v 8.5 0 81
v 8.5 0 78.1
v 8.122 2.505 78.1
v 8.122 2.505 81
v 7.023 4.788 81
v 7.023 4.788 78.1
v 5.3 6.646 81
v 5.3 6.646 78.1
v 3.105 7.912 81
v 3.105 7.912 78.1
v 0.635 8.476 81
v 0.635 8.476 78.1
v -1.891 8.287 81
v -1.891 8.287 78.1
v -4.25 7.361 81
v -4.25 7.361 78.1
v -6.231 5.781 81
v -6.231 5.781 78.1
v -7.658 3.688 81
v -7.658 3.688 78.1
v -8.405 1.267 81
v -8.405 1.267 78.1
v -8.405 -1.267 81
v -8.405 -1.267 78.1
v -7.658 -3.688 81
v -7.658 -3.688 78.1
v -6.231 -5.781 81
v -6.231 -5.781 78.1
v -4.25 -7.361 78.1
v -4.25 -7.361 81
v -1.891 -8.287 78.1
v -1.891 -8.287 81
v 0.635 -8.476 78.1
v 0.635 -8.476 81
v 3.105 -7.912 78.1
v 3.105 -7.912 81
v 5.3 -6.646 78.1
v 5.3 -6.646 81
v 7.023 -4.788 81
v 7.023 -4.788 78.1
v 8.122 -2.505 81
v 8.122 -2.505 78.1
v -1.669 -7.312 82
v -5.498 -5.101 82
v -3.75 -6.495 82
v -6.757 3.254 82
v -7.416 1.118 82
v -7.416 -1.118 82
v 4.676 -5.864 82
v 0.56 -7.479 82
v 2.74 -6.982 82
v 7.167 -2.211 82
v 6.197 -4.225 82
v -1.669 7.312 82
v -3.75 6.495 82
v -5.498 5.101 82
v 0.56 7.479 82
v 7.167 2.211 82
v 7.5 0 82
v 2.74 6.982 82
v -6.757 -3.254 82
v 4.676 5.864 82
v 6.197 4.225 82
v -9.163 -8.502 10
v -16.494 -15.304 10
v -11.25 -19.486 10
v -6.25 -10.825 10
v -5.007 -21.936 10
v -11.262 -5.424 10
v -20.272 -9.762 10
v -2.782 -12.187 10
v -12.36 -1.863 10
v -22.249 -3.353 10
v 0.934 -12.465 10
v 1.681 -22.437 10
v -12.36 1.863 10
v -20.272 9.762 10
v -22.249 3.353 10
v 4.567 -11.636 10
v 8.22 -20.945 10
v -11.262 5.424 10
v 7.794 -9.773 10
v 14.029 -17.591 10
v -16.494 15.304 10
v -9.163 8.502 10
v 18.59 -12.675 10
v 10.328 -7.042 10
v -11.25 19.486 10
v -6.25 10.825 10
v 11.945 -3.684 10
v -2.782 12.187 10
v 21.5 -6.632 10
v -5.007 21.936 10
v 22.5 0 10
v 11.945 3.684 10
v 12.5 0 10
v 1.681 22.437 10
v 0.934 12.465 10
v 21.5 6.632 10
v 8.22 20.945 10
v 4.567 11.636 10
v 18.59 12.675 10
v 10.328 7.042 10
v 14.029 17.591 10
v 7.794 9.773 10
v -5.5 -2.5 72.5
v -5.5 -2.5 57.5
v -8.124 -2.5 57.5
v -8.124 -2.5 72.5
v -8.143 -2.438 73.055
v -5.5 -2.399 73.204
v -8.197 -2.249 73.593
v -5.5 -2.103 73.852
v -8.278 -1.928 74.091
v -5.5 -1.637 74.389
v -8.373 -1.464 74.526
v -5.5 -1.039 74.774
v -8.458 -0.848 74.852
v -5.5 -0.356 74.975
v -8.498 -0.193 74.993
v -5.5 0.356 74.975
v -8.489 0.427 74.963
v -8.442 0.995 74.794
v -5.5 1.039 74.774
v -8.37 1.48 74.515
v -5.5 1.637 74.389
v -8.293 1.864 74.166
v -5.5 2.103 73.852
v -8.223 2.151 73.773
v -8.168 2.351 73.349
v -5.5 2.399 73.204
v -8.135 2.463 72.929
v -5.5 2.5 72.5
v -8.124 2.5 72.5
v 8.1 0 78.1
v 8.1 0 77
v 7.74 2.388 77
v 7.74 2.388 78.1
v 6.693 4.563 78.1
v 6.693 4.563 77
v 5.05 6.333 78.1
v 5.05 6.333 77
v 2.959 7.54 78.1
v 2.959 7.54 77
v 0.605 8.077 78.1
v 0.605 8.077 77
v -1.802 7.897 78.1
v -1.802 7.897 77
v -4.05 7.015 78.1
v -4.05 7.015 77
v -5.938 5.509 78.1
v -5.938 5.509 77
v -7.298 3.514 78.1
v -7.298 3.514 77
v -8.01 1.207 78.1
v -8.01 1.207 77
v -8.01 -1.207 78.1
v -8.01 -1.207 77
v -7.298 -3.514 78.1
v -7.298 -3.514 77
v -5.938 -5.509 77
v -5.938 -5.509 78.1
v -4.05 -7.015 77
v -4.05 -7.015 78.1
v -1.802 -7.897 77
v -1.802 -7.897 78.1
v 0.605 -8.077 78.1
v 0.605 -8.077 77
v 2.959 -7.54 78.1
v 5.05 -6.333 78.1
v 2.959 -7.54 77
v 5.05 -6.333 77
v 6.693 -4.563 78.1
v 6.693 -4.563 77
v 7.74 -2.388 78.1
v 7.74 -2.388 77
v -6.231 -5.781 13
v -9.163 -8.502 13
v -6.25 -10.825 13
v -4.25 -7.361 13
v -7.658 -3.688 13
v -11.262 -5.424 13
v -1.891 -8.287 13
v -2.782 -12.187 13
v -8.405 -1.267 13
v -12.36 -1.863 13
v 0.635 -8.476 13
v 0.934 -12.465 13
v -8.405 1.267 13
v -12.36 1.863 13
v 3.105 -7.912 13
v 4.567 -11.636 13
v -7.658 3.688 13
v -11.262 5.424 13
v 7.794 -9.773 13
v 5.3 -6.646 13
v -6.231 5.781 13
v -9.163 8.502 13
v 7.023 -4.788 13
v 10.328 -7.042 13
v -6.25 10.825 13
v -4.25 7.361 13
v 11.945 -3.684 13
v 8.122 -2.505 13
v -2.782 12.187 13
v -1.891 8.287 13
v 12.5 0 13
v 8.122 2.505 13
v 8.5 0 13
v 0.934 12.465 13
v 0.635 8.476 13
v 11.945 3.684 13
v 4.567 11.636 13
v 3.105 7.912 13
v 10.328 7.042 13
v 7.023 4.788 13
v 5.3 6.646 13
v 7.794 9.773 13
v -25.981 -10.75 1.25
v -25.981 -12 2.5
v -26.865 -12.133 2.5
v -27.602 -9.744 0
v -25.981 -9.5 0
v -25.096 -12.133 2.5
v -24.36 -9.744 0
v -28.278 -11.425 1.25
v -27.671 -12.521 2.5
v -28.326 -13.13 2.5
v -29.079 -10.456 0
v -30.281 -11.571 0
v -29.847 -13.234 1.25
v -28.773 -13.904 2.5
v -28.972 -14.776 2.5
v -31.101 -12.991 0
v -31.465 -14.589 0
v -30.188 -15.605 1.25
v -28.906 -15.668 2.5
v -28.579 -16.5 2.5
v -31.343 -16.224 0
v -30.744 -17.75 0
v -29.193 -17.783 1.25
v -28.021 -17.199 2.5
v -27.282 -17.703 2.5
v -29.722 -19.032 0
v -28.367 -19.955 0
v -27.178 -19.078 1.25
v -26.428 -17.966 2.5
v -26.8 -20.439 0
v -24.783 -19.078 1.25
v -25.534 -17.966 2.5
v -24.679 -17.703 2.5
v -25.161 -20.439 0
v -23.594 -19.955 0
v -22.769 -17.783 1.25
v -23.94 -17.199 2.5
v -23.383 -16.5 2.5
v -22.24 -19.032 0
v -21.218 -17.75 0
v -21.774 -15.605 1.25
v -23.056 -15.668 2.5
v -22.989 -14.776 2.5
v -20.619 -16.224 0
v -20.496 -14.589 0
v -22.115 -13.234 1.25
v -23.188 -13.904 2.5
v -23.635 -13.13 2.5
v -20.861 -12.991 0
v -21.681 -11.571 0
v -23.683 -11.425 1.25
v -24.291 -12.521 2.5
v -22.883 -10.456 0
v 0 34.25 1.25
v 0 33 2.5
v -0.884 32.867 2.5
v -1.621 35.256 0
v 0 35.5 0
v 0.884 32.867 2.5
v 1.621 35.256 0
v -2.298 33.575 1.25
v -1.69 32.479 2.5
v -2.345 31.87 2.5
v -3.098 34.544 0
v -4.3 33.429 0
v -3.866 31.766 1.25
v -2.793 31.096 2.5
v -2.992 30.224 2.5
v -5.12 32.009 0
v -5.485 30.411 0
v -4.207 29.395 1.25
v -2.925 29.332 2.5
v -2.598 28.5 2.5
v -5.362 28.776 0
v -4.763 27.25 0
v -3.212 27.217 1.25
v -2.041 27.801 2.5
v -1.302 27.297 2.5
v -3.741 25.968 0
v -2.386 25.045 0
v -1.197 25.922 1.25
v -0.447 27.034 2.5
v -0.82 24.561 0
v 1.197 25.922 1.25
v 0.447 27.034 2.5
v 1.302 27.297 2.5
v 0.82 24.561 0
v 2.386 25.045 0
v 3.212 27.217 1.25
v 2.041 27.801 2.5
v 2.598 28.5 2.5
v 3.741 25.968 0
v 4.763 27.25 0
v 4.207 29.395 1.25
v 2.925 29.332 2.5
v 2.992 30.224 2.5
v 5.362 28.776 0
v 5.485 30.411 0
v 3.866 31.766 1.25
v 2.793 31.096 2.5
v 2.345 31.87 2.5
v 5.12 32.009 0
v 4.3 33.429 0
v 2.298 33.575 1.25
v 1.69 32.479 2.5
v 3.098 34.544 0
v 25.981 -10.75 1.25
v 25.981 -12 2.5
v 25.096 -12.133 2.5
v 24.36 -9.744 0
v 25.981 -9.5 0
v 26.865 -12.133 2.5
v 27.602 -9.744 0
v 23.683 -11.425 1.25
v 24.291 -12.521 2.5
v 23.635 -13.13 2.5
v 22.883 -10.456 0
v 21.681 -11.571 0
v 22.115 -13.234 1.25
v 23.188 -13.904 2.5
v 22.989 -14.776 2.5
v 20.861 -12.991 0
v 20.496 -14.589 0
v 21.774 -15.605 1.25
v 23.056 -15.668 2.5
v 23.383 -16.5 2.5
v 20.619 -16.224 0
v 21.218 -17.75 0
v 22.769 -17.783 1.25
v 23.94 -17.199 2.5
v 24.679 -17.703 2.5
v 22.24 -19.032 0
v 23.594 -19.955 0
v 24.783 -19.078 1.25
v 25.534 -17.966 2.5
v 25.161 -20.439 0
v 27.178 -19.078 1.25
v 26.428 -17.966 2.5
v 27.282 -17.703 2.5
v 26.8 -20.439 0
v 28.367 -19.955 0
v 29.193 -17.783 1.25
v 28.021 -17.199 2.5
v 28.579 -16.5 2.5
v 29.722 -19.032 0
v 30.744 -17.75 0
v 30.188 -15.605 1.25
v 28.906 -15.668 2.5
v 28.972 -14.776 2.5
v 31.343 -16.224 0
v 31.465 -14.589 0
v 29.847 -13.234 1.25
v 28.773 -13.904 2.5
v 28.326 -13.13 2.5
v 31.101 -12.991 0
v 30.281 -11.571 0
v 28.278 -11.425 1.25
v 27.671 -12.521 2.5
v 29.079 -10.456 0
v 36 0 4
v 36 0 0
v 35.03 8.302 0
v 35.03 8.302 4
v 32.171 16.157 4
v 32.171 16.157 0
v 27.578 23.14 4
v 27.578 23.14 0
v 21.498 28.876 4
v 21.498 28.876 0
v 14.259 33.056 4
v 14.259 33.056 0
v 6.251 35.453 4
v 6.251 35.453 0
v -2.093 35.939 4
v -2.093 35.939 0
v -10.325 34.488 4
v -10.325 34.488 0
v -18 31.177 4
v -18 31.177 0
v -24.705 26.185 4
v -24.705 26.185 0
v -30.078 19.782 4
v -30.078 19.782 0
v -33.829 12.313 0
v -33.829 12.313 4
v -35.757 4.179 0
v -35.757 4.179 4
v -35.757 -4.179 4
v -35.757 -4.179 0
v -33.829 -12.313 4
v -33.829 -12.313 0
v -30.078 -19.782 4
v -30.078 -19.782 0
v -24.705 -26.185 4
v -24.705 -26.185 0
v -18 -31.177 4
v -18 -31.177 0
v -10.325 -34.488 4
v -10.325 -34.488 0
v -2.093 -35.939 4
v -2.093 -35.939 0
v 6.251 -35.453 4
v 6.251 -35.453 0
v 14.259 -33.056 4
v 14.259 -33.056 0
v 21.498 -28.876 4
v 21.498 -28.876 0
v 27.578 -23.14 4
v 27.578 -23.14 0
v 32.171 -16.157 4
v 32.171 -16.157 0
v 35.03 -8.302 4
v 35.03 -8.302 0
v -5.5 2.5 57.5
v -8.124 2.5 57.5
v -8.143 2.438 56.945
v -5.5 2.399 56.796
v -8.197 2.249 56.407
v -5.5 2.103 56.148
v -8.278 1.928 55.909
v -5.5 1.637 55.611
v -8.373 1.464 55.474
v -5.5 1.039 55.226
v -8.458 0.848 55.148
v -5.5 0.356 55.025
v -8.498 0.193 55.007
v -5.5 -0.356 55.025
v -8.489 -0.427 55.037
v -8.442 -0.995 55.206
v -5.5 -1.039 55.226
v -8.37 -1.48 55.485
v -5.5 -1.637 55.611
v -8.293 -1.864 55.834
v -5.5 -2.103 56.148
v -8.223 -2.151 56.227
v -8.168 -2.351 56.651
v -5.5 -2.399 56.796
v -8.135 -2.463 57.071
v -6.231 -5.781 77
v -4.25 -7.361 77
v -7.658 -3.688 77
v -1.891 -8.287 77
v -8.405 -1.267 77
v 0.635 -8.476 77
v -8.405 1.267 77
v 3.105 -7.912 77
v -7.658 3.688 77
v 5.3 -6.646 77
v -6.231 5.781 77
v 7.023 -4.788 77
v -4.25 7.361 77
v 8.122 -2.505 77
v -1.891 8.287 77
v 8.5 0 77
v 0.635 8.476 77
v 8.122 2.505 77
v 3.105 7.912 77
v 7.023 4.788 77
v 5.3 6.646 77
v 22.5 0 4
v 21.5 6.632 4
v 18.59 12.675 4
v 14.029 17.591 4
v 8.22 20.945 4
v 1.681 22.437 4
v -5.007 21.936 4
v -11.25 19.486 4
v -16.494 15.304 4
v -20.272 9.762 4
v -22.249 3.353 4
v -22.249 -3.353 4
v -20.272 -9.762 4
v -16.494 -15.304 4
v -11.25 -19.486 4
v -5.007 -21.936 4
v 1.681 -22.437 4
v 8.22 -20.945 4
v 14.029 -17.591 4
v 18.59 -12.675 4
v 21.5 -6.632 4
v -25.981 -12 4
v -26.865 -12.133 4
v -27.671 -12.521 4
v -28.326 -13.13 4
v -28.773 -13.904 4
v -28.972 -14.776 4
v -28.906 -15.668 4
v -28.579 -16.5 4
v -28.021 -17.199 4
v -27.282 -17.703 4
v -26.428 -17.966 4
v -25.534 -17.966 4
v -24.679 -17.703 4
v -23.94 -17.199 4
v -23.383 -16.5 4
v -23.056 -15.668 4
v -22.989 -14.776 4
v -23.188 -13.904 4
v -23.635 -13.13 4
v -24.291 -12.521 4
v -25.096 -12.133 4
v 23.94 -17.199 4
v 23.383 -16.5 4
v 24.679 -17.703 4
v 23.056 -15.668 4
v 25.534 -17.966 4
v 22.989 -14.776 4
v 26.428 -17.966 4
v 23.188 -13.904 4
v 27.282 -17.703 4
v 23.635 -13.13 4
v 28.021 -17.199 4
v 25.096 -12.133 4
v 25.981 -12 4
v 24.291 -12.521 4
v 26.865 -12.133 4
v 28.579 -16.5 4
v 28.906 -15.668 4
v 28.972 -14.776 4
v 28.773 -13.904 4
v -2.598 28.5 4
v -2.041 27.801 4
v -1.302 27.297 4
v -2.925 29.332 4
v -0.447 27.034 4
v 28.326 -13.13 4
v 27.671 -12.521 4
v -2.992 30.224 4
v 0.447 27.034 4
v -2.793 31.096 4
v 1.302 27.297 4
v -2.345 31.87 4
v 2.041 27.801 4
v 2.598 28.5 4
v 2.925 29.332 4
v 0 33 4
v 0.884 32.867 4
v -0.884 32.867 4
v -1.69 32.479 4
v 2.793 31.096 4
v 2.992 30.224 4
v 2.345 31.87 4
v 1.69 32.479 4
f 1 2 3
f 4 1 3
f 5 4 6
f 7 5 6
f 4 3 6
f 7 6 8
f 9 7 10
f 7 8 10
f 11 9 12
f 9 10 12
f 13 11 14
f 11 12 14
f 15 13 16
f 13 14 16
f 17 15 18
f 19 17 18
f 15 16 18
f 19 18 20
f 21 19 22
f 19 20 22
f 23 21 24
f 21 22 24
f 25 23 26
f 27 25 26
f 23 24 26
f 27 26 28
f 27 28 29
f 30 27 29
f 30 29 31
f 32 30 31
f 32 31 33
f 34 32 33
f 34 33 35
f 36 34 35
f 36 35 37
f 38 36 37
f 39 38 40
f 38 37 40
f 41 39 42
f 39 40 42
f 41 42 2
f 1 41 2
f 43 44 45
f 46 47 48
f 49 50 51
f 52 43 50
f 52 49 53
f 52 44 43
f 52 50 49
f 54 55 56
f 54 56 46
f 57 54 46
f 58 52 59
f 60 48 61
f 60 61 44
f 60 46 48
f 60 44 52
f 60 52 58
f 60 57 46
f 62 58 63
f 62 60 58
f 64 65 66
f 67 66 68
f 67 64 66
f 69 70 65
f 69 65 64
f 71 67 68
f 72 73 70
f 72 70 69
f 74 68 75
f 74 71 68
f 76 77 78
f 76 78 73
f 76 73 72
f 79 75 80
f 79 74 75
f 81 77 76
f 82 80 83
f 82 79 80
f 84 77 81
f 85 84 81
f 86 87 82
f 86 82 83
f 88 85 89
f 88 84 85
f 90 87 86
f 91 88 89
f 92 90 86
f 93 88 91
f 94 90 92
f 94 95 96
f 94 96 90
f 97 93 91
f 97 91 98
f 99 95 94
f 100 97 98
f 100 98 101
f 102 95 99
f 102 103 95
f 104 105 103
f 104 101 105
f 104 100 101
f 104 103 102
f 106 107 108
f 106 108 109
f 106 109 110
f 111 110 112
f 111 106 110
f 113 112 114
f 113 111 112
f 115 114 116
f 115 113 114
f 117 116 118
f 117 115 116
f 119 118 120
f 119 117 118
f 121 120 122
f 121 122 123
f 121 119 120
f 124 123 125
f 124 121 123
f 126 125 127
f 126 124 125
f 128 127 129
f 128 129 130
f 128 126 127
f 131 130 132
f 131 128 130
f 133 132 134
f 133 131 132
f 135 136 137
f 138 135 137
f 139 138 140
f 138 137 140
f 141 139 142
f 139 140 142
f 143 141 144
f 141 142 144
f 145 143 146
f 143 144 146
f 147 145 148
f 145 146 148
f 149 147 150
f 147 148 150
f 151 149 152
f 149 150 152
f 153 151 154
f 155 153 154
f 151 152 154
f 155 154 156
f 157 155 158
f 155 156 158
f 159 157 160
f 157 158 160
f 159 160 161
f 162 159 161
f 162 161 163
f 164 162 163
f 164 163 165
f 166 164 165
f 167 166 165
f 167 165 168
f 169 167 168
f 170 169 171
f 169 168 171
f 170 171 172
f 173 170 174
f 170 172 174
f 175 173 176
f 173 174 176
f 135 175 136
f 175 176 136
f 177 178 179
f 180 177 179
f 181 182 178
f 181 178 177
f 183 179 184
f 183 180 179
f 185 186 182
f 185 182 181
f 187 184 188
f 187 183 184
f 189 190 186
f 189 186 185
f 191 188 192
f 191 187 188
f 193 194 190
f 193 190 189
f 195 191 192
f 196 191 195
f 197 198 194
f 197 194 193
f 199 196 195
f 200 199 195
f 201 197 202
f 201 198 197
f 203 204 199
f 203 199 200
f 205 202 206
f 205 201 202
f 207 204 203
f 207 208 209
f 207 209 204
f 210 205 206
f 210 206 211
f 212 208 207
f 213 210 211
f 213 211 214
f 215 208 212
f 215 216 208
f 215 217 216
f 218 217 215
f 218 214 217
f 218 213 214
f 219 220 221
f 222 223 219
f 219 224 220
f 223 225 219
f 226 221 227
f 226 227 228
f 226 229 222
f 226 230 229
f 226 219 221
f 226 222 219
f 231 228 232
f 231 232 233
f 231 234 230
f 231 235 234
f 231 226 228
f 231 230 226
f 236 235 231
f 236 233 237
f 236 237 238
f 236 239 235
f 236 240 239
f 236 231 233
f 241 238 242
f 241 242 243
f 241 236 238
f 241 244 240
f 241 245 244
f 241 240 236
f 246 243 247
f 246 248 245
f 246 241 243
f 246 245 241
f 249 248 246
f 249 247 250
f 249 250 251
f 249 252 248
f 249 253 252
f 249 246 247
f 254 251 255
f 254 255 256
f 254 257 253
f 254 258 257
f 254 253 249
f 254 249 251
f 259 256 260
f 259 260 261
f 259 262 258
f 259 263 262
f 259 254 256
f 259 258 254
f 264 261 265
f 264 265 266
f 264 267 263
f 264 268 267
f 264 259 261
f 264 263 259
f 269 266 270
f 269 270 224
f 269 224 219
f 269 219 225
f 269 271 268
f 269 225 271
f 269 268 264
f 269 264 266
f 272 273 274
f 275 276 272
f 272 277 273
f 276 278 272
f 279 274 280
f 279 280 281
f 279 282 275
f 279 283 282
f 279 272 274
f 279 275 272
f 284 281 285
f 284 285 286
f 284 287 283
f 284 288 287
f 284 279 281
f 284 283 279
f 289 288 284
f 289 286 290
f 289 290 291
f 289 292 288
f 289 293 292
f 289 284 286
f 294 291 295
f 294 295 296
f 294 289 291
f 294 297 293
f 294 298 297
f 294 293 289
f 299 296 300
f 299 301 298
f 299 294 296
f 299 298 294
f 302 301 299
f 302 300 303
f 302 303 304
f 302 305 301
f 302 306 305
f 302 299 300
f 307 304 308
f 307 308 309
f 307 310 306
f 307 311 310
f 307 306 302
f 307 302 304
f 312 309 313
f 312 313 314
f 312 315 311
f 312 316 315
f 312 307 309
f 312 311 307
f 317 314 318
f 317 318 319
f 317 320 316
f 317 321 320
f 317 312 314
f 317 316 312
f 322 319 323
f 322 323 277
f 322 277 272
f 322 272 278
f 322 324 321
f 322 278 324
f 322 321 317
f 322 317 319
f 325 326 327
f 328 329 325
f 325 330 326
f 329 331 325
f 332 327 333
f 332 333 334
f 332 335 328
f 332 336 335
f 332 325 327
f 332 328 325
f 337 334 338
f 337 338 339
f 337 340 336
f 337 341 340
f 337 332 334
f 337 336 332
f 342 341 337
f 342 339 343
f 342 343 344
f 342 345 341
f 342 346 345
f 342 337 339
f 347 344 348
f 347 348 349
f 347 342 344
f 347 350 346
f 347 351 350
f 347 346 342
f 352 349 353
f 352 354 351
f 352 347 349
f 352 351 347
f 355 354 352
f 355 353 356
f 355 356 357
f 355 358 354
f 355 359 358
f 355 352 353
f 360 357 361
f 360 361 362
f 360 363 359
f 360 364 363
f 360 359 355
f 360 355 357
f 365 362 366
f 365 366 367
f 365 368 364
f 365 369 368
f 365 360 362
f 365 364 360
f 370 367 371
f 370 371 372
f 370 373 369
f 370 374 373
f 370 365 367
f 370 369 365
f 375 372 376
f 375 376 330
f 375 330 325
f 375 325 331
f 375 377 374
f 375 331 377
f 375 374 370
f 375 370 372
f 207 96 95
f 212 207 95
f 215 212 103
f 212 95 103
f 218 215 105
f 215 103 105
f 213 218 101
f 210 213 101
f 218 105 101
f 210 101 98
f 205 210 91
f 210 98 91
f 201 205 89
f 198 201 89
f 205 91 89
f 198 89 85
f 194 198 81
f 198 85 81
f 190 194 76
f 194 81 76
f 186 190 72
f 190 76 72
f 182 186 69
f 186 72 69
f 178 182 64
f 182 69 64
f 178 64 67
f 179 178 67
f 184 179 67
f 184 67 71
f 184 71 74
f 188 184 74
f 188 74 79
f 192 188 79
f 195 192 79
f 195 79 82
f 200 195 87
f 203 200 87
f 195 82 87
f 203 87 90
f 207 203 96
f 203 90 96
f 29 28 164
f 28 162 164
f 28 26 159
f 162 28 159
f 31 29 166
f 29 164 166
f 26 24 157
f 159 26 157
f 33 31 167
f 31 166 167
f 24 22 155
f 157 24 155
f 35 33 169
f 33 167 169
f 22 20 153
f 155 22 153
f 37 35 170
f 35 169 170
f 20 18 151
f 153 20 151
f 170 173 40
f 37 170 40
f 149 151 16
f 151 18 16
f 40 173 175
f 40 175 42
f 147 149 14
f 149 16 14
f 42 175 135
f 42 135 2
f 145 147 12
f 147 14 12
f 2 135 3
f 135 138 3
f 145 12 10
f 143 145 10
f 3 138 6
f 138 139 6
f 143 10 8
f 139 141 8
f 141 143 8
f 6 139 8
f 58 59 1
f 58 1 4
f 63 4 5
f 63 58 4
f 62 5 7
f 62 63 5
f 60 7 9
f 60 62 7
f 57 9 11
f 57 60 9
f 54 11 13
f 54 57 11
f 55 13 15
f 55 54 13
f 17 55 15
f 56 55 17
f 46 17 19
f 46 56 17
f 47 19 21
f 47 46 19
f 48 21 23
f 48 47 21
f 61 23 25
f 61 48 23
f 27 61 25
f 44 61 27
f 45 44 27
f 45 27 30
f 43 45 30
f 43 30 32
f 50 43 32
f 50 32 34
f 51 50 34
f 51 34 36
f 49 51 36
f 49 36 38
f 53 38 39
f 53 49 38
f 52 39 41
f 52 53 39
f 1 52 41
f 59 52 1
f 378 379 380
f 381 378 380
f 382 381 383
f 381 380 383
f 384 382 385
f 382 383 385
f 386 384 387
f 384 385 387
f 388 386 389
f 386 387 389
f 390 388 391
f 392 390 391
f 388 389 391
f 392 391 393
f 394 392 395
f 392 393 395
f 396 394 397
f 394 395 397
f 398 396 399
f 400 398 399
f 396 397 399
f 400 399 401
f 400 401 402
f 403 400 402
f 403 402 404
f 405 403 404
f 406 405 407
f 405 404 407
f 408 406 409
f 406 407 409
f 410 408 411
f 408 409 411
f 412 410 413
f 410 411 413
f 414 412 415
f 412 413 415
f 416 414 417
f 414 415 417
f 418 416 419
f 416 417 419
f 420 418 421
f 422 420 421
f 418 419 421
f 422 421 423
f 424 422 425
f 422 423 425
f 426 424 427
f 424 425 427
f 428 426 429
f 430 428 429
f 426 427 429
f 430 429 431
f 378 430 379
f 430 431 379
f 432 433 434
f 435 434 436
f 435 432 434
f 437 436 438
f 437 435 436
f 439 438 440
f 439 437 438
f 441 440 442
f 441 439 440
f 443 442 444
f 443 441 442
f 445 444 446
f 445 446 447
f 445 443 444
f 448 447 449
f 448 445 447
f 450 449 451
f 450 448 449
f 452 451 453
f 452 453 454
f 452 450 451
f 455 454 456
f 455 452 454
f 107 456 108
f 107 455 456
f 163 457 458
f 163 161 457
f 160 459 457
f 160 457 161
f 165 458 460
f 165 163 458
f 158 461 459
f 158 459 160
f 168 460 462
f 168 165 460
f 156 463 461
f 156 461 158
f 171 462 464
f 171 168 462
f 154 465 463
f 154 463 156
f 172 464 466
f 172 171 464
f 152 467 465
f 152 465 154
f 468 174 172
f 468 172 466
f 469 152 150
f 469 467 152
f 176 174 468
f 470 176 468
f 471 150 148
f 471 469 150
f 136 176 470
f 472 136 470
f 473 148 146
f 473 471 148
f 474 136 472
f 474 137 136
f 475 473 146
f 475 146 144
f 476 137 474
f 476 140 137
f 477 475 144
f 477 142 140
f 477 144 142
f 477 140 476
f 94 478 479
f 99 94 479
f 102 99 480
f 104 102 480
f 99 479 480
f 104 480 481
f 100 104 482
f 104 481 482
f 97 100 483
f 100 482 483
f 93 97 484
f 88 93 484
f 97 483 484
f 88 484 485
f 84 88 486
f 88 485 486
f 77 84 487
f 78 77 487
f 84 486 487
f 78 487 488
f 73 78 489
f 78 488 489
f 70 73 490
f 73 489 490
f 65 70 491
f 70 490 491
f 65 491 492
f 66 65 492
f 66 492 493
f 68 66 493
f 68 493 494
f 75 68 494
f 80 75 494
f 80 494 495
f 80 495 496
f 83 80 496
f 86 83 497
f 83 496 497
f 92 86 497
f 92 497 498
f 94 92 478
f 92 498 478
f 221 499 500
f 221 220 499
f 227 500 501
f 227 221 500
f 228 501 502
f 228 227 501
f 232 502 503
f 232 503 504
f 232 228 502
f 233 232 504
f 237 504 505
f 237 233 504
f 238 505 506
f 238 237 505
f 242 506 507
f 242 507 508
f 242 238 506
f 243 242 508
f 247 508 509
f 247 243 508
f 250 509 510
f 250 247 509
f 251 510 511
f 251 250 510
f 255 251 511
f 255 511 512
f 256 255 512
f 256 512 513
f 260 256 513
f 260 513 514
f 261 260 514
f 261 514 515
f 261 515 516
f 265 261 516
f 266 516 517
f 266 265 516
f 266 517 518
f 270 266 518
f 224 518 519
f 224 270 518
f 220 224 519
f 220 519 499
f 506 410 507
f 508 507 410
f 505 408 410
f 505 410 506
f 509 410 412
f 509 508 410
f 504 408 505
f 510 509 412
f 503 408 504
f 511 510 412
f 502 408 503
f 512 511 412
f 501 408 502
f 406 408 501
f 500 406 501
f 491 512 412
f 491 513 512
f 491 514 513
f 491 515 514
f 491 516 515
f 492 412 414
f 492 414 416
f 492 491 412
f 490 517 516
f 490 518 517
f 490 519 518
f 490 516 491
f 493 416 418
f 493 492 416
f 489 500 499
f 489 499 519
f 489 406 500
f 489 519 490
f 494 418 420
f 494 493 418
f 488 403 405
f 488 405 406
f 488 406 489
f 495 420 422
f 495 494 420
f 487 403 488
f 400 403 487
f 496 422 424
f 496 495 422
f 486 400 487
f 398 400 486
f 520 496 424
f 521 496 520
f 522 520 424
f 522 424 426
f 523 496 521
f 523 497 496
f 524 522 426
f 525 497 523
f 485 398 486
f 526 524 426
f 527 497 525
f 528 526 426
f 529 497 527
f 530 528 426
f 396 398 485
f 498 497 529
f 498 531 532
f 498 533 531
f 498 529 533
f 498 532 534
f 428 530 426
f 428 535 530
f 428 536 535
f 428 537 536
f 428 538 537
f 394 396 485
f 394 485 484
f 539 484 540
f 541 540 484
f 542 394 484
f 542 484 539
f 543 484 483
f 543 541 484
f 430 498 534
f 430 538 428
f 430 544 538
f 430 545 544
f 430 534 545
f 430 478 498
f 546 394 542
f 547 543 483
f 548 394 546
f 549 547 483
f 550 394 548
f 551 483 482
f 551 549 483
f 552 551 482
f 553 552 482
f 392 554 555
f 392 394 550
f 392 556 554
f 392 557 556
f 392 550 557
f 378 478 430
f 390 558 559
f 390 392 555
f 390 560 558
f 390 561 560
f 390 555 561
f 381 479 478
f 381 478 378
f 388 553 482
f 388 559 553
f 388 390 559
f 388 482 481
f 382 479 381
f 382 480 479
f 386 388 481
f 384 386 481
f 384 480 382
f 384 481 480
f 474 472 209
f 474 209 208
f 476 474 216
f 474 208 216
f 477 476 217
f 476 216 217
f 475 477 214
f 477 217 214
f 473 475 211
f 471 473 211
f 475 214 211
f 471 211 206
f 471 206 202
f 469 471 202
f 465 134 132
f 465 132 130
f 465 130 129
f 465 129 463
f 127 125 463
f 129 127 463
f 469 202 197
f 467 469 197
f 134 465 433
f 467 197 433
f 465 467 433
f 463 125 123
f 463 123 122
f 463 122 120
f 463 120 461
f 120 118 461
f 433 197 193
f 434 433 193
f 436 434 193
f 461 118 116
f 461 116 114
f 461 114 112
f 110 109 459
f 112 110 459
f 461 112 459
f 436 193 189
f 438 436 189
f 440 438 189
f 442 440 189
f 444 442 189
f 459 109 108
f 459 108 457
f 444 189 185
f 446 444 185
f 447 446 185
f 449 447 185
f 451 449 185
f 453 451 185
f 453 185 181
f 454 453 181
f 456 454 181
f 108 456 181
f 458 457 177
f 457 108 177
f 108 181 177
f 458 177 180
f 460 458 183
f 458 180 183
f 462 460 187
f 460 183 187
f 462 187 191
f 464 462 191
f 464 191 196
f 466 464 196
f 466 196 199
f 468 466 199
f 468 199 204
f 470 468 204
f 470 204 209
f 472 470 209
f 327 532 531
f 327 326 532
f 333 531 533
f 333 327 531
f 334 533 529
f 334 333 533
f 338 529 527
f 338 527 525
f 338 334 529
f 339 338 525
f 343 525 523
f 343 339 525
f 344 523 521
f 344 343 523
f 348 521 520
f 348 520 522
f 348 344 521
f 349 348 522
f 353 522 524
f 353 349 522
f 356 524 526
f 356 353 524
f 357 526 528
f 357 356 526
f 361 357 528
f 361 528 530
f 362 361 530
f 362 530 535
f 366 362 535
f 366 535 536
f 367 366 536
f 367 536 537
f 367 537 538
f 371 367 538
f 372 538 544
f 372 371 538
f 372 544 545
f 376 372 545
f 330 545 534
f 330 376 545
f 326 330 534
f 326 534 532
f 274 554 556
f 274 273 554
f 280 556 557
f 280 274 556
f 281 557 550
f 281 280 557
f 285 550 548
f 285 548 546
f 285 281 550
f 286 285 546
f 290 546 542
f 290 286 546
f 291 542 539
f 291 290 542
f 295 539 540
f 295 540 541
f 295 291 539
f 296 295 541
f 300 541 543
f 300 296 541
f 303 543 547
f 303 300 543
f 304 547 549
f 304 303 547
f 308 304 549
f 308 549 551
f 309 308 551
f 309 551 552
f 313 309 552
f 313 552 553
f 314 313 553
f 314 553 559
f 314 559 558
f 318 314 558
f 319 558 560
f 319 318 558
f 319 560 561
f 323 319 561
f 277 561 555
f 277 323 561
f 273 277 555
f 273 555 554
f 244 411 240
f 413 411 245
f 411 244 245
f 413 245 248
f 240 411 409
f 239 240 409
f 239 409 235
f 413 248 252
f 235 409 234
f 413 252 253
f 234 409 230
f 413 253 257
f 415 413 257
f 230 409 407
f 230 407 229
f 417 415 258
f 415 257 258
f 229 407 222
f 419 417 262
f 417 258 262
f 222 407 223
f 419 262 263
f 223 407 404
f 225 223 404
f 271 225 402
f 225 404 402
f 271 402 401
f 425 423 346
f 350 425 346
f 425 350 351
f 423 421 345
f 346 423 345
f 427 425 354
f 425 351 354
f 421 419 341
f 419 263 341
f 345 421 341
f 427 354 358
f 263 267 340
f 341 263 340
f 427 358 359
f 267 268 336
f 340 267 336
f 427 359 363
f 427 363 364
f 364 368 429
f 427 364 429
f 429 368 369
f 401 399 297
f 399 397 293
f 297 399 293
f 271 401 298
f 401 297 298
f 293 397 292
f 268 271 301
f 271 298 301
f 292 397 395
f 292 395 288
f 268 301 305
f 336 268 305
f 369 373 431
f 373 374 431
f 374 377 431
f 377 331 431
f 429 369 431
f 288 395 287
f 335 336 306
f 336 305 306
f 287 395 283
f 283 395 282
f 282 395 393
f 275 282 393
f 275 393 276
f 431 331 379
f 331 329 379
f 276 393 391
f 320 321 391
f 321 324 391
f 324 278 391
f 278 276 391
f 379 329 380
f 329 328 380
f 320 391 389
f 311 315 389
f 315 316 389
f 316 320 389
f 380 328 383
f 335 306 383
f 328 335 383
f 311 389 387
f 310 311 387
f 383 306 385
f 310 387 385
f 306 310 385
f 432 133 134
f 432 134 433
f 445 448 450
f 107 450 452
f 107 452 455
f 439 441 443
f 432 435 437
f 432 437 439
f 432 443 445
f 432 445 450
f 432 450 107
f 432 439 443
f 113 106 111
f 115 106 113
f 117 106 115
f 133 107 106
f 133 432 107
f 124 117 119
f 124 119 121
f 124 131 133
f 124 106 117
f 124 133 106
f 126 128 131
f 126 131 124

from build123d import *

# Parameters (mm, degrees)
SKETCH_1_R                     = 36
EXTRUDE_1_DEPTH                = 4
SKETCH_2_R                     = 22.5
EXTRUDE_2_DEPTH                = 6
SKETCH_3_R                     = 12.5
EXTRUDE_3_DEPTH                = 3
SKETCH_4_R                     = 8.5
EXTRUDE_4_DEPTH                = 64
SKETCH_5_R                     = 8.1
EXTRUDE_5_DEPTH                = 1.1
SKETCH_6_R                     = 8.5
EXTRUDE_6_DEPTH                = 3.9
CHAMFER_1_SIZE                 = 1
HOLE_WIZARD_6_0_6_1_AT_2_COUNT = 2
HOLE_WIZARD_6_0_6_1_AT_2_PITCH = 51.961524227
HOLE_WIZARD_6_0_6_1_AT_3_COUNT = 2
HOLE_WIZARD_6_0_6_1_AT_3_PITCH = 51.961524227
CUT_EXTRUDE_START              = -5.5
CUT_EXTRUDE_1_DEPTH            = 92.019428096


with BuildPart() as part:
    # 草图1 → 凸台-拉伸1 (new body)
    with BuildSketch(Plane.XY):
        Circle(SKETCH_1_R)
    extrude(amount=EXTRUDE_1_DEPTH)

    # 草图2 → 凸台-拉伸2 (add)
    with BuildSketch(Plane.XY.offset(4)):
        Circle(SKETCH_2_R)
    extrude(amount=EXTRUDE_2_DEPTH)

    # 草图3 → 凸台-拉伸3 (add)
    with BuildSketch(Plane.XY.offset(10)):
        Circle(SKETCH_3_R)
    extrude(amount=EXTRUDE_3_DEPTH)

    # 草图4 → 凸台-拉伸4 (add)
    with BuildSketch(Plane.XY.offset(13)):
        Circle(SKETCH_4_R)
    extrude(amount=EXTRUDE_4_DEPTH)

    # 草图5 → 凸台-拉伸5 (add)
    with BuildSketch(Plane.XY.offset(77)):
        Circle(SKETCH_5_R)
    extrude(amount=EXTRUDE_5_DEPTH)

    # 草图6 → 凸台-拉伸6 (add)
    with BuildSketch(Plane.XY.offset(78.1)):
        Circle(SKETCH_6_R)
    extrude(amount=EXTRUDE_6_DEPTH)

    # 倒角1
    chamfer_1_edges = [part.edges().sort_by_distance(p)[0] for p in [
        (-8.5, 0, 82),
    ]]
    chamfer(chamfer_1_edges, length=CHAMFER_1_SIZE)

    # 草图8 → Ø6.0 (6) 直径孔1 (revolve, cut)
    with BuildSketch(Plane(origin=(-25.980762114, -15, 0), x_dir=(0, 1, 0), z_dir=(1, 0, 0))):
        Polygon((0, 0), (0, 4), (3, 4), (3, 2.5), (5.5, 0), align=None)
    hole_wizard_6_0_6_1 = revolve(axis=Axis((-25.980762114, -15, -6.35), (0, 0, 1)), mode=Mode.SUBTRACT)

    # Ø6.0 (6) 直径孔1 at 2: Ø6.0 (6) 直径孔1 ×2
    with Locations(*[Vector(0.499999999999998, 0.8660254037844398, 0) * (i * HOLE_WIZARD_6_0_6_1_AT_2_PITCH) for i in range(1, HOLE_WIZARD_6_0_6_1_AT_2_COUNT)]):
        add(hole_wizard_6_0_6_1, mode=Mode.SUBTRACT)

    # Ø6.0 (6) 直径孔1 at 3: Ø6.0 (6) 直径孔1 ×2
    with Locations(*[(i * HOLE_WIZARD_6_0_6_1_AT_3_PITCH, 0, 0) for i in range(1, HOLE_WIZARD_6_0_6_1_AT_3_COUNT)]):
        add(hole_wizard_6_0_6_1, mode=Mode.SUBTRACT)

    # 草图9 → 切除-拉伸1 (cut, through all)
    with BuildSketch(Plane(origin=(0, 0, 0), x_dir=(0, 0, -1), z_dir=(1, 0, 0)).offset(CUT_EXTRUDE_START)):
        with BuildLine():
            Line((-72.5, 2.5), (-57.5, 2.5))
            ThreePointArc((-57.5, 2.5), (-55, 0), (-57.5, -2.5))
            Line((-57.5, -2.5), (-72.5, -2.5))
            ThreePointArc((-72.5, -2.5), (-75, 0), (-72.5, 2.5))
        make_face()
    extrude(amount=-CUT_EXTRUDE_1_DEPTH, mode=Mode.SUBTRACT)


solid = part.part
